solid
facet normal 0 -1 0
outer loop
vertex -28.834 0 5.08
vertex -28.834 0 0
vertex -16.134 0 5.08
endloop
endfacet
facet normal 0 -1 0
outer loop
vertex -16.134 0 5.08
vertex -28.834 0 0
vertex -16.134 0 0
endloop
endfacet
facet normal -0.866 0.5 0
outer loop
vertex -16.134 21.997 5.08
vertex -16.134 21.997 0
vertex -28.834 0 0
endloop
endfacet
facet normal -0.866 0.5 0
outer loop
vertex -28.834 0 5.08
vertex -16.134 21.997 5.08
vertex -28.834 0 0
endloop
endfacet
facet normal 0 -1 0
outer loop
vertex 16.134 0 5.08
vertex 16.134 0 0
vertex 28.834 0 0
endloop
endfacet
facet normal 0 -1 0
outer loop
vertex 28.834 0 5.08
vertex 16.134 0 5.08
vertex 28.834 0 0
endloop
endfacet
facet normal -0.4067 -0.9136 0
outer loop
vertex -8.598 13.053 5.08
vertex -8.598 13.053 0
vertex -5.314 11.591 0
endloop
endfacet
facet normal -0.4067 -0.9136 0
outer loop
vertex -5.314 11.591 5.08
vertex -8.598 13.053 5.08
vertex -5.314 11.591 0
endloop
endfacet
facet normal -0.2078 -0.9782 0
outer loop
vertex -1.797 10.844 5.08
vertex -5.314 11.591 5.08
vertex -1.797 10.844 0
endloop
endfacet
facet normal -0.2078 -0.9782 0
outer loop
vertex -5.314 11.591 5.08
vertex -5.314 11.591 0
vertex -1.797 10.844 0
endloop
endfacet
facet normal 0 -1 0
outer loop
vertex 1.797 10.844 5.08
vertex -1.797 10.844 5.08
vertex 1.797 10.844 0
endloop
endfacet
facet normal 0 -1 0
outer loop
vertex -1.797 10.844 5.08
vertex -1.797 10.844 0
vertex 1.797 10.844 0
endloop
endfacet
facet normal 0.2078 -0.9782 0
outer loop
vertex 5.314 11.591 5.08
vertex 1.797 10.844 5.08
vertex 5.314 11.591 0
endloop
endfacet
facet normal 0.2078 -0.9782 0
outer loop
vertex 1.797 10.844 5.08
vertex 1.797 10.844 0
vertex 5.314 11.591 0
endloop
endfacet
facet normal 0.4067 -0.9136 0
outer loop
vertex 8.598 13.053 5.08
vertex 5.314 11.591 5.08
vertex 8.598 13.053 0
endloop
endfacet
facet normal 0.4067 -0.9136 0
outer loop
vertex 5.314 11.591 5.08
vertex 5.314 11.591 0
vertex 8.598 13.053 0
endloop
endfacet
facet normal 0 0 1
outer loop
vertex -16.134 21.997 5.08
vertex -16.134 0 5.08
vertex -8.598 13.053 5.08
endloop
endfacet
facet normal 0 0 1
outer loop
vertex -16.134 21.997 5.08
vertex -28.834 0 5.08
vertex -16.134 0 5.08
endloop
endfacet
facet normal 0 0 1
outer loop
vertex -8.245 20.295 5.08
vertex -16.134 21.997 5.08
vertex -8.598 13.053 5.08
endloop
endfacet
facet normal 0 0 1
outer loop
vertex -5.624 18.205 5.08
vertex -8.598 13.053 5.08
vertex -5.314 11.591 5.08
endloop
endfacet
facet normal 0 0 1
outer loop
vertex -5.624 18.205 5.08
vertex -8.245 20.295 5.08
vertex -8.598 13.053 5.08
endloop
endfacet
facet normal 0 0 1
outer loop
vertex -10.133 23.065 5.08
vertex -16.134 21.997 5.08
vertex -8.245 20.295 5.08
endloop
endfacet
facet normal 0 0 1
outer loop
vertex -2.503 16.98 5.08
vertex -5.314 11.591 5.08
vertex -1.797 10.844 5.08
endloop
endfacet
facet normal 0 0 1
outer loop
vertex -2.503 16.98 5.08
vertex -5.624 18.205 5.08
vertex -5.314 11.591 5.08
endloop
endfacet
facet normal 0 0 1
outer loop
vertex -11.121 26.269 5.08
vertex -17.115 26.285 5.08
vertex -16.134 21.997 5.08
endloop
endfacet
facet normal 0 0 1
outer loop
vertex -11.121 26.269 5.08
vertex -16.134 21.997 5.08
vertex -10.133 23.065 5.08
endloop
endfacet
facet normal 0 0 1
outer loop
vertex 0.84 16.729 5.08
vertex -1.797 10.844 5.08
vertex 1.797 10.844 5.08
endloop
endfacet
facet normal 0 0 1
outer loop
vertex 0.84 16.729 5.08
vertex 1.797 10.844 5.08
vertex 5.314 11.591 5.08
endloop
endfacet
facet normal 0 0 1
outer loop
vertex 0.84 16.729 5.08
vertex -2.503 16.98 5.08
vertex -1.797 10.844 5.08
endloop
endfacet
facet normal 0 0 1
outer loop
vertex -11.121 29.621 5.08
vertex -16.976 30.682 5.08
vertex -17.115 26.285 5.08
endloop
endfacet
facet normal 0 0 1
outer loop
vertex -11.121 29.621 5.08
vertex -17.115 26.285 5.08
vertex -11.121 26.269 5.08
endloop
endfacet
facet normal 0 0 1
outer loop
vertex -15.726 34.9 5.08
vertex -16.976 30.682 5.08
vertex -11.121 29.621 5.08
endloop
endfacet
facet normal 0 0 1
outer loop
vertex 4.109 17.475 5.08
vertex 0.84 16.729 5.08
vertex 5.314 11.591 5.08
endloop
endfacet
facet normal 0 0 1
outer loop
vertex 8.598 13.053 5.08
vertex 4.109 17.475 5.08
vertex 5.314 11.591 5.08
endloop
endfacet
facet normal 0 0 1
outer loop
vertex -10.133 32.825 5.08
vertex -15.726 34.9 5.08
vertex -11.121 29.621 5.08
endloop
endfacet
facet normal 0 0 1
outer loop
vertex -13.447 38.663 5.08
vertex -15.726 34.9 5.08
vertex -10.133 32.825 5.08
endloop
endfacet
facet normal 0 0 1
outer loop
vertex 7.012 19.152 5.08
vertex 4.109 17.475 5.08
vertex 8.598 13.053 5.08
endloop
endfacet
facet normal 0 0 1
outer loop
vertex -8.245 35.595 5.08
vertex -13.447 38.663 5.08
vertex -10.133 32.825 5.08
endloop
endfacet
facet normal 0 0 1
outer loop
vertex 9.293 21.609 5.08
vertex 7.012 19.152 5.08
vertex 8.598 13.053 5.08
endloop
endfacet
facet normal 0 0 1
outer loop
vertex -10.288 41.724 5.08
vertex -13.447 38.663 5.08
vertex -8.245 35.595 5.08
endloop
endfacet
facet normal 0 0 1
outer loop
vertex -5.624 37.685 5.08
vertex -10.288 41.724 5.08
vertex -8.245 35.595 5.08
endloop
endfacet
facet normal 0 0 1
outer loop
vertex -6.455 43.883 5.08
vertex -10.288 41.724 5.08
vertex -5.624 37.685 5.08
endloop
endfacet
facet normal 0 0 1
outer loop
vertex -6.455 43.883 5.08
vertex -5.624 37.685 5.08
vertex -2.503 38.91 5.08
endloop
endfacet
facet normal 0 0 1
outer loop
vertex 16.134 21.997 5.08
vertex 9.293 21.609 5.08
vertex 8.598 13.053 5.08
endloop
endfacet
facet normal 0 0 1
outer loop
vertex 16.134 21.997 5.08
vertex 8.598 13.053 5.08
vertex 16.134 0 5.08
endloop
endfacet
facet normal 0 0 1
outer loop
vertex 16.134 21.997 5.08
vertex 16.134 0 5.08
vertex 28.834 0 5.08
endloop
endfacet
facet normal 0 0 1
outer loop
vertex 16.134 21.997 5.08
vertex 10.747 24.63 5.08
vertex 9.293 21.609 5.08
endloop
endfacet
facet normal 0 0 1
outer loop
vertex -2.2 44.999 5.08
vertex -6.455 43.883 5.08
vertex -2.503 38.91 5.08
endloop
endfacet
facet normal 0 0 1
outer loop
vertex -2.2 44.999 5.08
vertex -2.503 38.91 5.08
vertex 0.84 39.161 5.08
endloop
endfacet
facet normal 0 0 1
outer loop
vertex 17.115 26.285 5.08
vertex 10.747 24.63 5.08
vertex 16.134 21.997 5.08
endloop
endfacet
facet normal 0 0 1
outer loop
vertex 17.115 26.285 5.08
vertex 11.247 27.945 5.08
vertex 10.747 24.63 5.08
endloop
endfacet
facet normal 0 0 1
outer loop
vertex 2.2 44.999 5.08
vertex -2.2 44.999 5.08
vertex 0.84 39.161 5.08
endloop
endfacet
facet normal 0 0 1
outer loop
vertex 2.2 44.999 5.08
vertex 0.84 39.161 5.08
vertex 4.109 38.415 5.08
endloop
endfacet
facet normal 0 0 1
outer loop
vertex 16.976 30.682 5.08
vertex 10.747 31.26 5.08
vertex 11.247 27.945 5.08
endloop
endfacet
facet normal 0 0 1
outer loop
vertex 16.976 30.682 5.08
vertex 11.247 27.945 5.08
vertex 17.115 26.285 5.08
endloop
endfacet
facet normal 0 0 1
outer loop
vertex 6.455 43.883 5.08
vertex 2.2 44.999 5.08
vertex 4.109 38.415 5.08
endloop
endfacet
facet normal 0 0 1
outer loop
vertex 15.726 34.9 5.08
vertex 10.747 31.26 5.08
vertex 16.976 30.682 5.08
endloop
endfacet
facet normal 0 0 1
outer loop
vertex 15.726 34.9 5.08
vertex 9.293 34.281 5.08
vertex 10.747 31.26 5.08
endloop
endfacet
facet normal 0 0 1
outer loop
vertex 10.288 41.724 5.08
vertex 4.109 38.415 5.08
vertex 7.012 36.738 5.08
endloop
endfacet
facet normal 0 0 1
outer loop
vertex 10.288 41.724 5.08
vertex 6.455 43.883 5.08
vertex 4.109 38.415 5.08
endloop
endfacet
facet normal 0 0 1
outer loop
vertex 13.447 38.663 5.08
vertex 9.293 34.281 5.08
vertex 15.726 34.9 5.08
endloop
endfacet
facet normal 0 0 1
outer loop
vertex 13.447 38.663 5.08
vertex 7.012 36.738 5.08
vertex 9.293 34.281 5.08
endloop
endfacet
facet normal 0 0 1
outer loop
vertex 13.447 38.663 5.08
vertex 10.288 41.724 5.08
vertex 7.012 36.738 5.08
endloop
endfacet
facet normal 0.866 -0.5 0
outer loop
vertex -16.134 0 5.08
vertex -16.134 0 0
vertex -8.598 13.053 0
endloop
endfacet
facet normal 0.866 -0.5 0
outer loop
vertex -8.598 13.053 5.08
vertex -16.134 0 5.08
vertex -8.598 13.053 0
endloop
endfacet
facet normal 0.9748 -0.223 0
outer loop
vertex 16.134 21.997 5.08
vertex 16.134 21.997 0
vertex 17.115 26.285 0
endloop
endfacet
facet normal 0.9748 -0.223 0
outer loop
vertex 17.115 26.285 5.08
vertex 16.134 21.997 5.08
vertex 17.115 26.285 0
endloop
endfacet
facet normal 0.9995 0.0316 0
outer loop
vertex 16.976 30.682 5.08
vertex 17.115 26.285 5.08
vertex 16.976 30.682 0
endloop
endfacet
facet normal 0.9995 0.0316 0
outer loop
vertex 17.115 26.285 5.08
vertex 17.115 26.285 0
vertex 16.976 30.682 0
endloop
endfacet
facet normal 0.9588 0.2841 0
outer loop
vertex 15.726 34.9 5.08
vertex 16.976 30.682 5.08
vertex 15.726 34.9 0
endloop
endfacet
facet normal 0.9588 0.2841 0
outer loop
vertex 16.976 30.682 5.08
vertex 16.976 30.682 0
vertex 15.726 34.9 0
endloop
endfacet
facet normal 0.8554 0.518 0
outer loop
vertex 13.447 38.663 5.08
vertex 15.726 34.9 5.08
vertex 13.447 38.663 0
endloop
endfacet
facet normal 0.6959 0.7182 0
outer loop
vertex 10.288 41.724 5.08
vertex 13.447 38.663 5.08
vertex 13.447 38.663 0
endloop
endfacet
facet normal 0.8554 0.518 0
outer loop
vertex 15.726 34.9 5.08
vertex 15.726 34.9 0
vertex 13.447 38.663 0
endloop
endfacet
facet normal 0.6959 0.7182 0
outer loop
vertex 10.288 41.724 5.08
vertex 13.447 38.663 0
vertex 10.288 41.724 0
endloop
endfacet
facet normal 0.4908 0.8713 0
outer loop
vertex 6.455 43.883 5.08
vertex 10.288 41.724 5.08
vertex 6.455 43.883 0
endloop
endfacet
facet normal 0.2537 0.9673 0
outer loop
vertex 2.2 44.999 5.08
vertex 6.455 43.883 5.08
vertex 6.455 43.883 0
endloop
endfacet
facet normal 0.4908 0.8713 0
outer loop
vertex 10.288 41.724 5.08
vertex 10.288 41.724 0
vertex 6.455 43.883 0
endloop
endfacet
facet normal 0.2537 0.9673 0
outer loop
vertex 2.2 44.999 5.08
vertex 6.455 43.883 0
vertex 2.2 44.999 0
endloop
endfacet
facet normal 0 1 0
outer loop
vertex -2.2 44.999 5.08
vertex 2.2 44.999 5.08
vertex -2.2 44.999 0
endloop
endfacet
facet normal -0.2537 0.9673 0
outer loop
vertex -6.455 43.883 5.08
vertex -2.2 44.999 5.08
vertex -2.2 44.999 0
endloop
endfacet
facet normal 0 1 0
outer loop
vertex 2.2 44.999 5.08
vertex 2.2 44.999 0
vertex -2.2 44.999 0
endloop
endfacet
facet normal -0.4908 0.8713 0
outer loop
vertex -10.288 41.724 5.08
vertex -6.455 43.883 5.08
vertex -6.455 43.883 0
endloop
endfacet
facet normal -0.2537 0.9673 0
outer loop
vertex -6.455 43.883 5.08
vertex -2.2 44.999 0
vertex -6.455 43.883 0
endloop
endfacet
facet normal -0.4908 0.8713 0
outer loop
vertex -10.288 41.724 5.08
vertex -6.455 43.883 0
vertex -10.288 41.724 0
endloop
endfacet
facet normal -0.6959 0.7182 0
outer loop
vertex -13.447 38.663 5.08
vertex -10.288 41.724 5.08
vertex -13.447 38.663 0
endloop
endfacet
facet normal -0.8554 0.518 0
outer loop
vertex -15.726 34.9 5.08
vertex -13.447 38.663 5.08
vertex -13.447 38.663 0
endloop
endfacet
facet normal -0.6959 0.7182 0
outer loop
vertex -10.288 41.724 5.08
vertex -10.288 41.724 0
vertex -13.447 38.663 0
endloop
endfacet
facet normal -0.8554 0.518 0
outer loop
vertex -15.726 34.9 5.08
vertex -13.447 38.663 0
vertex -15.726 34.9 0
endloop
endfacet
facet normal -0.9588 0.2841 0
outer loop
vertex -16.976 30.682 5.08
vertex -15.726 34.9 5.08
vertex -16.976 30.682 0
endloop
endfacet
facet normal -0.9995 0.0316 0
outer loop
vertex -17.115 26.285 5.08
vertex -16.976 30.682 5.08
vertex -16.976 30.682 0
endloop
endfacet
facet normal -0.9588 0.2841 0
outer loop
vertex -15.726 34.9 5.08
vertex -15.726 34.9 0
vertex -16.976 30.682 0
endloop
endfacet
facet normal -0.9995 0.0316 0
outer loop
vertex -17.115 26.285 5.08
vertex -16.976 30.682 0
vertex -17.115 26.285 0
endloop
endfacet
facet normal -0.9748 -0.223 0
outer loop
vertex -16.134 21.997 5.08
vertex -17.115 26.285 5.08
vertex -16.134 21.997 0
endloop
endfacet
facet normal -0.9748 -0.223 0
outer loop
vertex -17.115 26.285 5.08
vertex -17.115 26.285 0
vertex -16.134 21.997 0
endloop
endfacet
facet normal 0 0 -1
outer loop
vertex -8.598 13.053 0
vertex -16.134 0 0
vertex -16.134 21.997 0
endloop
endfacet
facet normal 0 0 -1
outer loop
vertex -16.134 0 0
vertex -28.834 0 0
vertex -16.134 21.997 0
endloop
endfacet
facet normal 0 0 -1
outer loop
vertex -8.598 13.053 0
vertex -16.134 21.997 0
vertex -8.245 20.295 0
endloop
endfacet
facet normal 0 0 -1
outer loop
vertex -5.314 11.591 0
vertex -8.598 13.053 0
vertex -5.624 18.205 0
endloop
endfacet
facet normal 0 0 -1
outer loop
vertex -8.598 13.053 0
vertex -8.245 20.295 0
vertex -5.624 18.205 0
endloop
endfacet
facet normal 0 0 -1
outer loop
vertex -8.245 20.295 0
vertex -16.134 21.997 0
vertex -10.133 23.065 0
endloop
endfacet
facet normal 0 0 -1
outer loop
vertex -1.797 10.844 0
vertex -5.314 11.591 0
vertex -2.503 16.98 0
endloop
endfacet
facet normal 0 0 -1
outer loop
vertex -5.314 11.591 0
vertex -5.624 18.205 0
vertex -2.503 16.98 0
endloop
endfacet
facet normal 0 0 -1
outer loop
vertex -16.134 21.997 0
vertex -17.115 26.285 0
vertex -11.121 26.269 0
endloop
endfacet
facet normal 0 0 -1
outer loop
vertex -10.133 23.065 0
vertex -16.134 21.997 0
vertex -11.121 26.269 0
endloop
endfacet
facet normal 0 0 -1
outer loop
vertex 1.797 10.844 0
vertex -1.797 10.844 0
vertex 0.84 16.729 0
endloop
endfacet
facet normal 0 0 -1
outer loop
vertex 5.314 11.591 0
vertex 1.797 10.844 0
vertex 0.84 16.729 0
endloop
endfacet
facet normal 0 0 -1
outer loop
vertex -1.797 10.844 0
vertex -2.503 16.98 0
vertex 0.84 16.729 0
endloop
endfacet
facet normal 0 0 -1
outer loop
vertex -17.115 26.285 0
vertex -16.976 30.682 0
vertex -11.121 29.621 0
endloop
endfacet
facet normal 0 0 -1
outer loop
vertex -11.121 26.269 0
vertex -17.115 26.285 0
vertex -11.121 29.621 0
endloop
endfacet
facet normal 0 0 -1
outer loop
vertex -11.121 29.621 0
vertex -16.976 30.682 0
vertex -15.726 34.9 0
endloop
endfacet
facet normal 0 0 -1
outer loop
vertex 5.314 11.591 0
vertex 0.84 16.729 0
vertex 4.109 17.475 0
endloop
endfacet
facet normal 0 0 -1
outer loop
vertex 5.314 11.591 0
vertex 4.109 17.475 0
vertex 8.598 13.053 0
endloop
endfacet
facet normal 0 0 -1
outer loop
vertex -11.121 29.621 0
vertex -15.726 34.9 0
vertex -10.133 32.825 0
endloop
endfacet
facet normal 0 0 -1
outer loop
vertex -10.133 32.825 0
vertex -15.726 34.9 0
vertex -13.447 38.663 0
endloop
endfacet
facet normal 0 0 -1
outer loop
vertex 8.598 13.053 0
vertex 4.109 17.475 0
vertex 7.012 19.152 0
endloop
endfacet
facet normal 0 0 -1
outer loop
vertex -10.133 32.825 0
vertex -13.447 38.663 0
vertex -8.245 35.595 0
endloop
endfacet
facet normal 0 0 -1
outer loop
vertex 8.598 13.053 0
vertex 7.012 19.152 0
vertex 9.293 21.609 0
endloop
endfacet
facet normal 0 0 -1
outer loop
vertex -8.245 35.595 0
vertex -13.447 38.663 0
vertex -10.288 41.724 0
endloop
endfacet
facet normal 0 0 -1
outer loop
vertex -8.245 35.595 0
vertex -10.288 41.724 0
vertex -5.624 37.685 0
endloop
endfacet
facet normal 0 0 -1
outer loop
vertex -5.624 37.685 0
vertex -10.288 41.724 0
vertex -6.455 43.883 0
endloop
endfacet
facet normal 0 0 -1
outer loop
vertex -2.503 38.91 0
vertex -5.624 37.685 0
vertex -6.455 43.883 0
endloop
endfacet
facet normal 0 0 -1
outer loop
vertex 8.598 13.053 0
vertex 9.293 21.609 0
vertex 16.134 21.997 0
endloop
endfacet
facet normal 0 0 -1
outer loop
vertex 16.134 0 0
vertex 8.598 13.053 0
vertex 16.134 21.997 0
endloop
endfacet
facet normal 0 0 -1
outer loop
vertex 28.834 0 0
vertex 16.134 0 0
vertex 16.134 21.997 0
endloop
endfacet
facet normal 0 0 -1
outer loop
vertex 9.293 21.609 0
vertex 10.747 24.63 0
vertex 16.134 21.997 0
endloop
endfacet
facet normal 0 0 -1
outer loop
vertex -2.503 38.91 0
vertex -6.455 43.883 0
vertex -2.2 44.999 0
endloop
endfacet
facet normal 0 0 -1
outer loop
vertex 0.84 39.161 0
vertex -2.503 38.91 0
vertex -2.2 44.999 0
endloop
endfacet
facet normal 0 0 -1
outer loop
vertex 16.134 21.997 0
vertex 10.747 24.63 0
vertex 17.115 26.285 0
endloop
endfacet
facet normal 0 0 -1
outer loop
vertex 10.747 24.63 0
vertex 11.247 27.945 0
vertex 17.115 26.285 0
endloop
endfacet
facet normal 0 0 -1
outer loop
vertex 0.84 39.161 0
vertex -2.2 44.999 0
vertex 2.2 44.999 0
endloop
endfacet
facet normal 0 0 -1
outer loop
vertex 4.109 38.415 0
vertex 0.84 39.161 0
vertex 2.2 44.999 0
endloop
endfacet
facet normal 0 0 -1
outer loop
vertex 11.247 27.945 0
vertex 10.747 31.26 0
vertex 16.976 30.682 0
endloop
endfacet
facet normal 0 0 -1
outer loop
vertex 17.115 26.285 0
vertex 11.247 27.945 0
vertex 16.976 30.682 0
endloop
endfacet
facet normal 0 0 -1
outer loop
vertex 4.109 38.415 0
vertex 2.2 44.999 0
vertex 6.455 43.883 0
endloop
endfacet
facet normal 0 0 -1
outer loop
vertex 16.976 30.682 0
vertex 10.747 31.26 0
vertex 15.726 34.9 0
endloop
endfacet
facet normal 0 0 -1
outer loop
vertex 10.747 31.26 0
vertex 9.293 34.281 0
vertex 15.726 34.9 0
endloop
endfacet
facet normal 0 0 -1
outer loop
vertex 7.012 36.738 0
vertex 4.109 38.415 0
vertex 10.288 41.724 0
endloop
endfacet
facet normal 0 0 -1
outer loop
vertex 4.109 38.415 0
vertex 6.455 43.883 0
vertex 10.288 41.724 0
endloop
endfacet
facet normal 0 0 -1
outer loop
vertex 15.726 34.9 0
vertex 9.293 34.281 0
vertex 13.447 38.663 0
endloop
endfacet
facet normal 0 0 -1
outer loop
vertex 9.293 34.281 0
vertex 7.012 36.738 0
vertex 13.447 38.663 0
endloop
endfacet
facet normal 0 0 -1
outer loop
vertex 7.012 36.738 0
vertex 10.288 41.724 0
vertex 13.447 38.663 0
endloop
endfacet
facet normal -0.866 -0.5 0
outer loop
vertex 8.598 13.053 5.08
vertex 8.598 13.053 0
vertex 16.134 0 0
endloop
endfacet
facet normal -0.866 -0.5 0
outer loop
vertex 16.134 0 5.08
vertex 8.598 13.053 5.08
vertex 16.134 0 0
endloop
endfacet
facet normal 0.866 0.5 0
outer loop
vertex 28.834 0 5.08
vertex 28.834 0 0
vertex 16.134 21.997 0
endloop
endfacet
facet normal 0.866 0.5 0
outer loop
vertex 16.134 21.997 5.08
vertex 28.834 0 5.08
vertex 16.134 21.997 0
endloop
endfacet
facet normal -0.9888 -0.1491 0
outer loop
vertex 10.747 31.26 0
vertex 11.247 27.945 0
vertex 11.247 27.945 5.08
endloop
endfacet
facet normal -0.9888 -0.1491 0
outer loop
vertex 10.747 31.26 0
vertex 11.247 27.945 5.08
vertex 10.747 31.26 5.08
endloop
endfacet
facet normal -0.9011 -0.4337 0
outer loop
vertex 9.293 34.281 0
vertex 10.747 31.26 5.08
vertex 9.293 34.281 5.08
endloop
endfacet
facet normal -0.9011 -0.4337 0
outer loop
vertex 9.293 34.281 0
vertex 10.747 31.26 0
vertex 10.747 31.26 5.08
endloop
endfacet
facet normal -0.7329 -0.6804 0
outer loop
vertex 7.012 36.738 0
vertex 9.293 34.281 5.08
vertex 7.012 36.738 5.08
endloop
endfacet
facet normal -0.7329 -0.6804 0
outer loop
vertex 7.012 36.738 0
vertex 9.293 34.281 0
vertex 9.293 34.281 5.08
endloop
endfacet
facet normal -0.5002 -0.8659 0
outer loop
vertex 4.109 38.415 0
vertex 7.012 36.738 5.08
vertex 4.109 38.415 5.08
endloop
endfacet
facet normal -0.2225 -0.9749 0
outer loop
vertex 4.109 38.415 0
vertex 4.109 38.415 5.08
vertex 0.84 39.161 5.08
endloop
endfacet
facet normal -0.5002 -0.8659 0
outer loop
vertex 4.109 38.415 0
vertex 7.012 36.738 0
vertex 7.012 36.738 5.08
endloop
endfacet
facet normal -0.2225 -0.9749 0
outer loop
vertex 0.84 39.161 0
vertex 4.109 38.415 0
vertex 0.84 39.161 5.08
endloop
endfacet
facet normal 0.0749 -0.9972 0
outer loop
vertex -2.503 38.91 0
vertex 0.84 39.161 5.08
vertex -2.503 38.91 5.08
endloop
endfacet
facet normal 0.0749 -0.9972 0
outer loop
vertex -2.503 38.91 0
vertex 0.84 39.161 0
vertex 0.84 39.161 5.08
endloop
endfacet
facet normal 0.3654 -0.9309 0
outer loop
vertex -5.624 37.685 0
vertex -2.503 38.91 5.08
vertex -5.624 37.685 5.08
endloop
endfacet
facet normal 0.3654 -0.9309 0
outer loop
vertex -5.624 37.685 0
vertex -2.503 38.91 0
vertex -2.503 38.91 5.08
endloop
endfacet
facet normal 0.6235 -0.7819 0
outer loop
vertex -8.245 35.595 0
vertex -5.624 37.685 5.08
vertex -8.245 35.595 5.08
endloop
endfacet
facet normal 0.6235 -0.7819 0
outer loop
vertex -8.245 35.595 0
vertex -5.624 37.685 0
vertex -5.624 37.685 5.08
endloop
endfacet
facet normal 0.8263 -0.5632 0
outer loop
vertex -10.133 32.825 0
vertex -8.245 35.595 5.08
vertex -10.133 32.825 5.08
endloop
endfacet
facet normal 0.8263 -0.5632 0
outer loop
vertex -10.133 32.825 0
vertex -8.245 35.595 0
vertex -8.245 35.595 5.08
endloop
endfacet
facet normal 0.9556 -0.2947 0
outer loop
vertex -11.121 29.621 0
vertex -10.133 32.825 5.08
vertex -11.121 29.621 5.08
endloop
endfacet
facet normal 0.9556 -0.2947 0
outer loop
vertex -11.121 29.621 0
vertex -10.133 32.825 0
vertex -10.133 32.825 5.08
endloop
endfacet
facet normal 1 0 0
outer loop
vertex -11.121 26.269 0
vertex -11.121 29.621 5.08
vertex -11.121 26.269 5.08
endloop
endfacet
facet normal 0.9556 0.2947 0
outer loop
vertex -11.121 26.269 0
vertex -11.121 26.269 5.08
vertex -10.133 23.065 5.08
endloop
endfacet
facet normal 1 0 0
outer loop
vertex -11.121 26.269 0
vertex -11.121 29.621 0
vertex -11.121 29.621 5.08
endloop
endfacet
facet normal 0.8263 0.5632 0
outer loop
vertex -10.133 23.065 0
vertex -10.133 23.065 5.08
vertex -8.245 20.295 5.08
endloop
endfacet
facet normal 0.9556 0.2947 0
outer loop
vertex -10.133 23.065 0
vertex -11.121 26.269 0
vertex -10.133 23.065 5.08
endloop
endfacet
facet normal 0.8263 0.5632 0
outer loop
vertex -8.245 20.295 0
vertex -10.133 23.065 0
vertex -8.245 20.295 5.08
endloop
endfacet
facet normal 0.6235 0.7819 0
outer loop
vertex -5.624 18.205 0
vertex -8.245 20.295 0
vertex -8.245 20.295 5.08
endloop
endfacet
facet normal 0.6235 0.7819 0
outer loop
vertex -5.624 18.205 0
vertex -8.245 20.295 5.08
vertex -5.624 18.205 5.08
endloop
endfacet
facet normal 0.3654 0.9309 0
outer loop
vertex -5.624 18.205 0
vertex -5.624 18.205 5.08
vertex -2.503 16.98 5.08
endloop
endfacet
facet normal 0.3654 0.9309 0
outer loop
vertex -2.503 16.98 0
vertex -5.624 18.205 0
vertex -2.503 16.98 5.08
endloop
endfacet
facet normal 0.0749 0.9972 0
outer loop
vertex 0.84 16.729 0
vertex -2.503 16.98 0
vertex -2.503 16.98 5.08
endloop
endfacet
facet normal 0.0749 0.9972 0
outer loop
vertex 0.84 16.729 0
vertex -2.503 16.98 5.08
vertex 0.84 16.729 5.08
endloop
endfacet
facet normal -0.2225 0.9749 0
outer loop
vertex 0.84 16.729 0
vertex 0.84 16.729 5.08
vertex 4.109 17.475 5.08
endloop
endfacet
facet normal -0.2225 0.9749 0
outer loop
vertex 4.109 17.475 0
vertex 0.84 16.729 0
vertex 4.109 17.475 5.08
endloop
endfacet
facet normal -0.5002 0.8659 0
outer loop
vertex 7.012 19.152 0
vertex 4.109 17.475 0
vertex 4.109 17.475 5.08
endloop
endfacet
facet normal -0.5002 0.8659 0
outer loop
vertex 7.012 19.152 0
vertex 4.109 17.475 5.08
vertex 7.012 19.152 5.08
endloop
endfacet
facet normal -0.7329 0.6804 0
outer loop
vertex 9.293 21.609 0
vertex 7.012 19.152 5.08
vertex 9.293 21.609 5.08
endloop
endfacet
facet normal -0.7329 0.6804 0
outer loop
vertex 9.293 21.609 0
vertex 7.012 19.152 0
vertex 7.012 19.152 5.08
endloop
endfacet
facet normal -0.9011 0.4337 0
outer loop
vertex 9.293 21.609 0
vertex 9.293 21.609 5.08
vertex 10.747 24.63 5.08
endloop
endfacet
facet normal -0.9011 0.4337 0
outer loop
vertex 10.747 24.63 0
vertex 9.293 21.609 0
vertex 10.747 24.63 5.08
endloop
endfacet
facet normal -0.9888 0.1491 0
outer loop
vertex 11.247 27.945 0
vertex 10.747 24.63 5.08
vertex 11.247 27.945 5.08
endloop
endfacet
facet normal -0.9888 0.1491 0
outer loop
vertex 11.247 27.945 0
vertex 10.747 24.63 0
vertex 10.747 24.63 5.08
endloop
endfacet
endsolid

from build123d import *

# Parameters (mm, degrees)
SKETCH1_R           = 11.24712
BOSS_EXTRUDE2_DEPTH = 5.08


with BuildPart() as part:
    # Sketch1 → Boss-Extrude2 (new body)
    with BuildSketch(Plane.XY):
        with BuildLine():
            Line((-16.134114125, 0), (-8.597805797, 13.053268926))
            ThreePointArc((-8.597805797, 13.053268926), (0, 10.749493806), (8.597805797, 13.053268926))
            Line((8.597805797, 13.053268926), (16.134114125, 0))
            Line((16.134114125, 0), (28.834114125, 0))
            Line((28.834114125, 0), (16.134114125, 21.997045256))
            ThreePointArc((16.134114125, 21.997045256), (0, 45.140716994), (-16.134114125, 21.997045256))
            Line((-16.134114125, 21.997045256), (-28.834114125, 0))
            Line((-28.834114125, 0), (-16.134114125, 0))
        make_face()
        with Locations((0, 27.9451054)):
            Circle(SKETCH1_R, mode=Mode.SUBTRACT)
    extrude(amount=BOSS_EXTRUDE2_DEPTH)


solid = part.part
